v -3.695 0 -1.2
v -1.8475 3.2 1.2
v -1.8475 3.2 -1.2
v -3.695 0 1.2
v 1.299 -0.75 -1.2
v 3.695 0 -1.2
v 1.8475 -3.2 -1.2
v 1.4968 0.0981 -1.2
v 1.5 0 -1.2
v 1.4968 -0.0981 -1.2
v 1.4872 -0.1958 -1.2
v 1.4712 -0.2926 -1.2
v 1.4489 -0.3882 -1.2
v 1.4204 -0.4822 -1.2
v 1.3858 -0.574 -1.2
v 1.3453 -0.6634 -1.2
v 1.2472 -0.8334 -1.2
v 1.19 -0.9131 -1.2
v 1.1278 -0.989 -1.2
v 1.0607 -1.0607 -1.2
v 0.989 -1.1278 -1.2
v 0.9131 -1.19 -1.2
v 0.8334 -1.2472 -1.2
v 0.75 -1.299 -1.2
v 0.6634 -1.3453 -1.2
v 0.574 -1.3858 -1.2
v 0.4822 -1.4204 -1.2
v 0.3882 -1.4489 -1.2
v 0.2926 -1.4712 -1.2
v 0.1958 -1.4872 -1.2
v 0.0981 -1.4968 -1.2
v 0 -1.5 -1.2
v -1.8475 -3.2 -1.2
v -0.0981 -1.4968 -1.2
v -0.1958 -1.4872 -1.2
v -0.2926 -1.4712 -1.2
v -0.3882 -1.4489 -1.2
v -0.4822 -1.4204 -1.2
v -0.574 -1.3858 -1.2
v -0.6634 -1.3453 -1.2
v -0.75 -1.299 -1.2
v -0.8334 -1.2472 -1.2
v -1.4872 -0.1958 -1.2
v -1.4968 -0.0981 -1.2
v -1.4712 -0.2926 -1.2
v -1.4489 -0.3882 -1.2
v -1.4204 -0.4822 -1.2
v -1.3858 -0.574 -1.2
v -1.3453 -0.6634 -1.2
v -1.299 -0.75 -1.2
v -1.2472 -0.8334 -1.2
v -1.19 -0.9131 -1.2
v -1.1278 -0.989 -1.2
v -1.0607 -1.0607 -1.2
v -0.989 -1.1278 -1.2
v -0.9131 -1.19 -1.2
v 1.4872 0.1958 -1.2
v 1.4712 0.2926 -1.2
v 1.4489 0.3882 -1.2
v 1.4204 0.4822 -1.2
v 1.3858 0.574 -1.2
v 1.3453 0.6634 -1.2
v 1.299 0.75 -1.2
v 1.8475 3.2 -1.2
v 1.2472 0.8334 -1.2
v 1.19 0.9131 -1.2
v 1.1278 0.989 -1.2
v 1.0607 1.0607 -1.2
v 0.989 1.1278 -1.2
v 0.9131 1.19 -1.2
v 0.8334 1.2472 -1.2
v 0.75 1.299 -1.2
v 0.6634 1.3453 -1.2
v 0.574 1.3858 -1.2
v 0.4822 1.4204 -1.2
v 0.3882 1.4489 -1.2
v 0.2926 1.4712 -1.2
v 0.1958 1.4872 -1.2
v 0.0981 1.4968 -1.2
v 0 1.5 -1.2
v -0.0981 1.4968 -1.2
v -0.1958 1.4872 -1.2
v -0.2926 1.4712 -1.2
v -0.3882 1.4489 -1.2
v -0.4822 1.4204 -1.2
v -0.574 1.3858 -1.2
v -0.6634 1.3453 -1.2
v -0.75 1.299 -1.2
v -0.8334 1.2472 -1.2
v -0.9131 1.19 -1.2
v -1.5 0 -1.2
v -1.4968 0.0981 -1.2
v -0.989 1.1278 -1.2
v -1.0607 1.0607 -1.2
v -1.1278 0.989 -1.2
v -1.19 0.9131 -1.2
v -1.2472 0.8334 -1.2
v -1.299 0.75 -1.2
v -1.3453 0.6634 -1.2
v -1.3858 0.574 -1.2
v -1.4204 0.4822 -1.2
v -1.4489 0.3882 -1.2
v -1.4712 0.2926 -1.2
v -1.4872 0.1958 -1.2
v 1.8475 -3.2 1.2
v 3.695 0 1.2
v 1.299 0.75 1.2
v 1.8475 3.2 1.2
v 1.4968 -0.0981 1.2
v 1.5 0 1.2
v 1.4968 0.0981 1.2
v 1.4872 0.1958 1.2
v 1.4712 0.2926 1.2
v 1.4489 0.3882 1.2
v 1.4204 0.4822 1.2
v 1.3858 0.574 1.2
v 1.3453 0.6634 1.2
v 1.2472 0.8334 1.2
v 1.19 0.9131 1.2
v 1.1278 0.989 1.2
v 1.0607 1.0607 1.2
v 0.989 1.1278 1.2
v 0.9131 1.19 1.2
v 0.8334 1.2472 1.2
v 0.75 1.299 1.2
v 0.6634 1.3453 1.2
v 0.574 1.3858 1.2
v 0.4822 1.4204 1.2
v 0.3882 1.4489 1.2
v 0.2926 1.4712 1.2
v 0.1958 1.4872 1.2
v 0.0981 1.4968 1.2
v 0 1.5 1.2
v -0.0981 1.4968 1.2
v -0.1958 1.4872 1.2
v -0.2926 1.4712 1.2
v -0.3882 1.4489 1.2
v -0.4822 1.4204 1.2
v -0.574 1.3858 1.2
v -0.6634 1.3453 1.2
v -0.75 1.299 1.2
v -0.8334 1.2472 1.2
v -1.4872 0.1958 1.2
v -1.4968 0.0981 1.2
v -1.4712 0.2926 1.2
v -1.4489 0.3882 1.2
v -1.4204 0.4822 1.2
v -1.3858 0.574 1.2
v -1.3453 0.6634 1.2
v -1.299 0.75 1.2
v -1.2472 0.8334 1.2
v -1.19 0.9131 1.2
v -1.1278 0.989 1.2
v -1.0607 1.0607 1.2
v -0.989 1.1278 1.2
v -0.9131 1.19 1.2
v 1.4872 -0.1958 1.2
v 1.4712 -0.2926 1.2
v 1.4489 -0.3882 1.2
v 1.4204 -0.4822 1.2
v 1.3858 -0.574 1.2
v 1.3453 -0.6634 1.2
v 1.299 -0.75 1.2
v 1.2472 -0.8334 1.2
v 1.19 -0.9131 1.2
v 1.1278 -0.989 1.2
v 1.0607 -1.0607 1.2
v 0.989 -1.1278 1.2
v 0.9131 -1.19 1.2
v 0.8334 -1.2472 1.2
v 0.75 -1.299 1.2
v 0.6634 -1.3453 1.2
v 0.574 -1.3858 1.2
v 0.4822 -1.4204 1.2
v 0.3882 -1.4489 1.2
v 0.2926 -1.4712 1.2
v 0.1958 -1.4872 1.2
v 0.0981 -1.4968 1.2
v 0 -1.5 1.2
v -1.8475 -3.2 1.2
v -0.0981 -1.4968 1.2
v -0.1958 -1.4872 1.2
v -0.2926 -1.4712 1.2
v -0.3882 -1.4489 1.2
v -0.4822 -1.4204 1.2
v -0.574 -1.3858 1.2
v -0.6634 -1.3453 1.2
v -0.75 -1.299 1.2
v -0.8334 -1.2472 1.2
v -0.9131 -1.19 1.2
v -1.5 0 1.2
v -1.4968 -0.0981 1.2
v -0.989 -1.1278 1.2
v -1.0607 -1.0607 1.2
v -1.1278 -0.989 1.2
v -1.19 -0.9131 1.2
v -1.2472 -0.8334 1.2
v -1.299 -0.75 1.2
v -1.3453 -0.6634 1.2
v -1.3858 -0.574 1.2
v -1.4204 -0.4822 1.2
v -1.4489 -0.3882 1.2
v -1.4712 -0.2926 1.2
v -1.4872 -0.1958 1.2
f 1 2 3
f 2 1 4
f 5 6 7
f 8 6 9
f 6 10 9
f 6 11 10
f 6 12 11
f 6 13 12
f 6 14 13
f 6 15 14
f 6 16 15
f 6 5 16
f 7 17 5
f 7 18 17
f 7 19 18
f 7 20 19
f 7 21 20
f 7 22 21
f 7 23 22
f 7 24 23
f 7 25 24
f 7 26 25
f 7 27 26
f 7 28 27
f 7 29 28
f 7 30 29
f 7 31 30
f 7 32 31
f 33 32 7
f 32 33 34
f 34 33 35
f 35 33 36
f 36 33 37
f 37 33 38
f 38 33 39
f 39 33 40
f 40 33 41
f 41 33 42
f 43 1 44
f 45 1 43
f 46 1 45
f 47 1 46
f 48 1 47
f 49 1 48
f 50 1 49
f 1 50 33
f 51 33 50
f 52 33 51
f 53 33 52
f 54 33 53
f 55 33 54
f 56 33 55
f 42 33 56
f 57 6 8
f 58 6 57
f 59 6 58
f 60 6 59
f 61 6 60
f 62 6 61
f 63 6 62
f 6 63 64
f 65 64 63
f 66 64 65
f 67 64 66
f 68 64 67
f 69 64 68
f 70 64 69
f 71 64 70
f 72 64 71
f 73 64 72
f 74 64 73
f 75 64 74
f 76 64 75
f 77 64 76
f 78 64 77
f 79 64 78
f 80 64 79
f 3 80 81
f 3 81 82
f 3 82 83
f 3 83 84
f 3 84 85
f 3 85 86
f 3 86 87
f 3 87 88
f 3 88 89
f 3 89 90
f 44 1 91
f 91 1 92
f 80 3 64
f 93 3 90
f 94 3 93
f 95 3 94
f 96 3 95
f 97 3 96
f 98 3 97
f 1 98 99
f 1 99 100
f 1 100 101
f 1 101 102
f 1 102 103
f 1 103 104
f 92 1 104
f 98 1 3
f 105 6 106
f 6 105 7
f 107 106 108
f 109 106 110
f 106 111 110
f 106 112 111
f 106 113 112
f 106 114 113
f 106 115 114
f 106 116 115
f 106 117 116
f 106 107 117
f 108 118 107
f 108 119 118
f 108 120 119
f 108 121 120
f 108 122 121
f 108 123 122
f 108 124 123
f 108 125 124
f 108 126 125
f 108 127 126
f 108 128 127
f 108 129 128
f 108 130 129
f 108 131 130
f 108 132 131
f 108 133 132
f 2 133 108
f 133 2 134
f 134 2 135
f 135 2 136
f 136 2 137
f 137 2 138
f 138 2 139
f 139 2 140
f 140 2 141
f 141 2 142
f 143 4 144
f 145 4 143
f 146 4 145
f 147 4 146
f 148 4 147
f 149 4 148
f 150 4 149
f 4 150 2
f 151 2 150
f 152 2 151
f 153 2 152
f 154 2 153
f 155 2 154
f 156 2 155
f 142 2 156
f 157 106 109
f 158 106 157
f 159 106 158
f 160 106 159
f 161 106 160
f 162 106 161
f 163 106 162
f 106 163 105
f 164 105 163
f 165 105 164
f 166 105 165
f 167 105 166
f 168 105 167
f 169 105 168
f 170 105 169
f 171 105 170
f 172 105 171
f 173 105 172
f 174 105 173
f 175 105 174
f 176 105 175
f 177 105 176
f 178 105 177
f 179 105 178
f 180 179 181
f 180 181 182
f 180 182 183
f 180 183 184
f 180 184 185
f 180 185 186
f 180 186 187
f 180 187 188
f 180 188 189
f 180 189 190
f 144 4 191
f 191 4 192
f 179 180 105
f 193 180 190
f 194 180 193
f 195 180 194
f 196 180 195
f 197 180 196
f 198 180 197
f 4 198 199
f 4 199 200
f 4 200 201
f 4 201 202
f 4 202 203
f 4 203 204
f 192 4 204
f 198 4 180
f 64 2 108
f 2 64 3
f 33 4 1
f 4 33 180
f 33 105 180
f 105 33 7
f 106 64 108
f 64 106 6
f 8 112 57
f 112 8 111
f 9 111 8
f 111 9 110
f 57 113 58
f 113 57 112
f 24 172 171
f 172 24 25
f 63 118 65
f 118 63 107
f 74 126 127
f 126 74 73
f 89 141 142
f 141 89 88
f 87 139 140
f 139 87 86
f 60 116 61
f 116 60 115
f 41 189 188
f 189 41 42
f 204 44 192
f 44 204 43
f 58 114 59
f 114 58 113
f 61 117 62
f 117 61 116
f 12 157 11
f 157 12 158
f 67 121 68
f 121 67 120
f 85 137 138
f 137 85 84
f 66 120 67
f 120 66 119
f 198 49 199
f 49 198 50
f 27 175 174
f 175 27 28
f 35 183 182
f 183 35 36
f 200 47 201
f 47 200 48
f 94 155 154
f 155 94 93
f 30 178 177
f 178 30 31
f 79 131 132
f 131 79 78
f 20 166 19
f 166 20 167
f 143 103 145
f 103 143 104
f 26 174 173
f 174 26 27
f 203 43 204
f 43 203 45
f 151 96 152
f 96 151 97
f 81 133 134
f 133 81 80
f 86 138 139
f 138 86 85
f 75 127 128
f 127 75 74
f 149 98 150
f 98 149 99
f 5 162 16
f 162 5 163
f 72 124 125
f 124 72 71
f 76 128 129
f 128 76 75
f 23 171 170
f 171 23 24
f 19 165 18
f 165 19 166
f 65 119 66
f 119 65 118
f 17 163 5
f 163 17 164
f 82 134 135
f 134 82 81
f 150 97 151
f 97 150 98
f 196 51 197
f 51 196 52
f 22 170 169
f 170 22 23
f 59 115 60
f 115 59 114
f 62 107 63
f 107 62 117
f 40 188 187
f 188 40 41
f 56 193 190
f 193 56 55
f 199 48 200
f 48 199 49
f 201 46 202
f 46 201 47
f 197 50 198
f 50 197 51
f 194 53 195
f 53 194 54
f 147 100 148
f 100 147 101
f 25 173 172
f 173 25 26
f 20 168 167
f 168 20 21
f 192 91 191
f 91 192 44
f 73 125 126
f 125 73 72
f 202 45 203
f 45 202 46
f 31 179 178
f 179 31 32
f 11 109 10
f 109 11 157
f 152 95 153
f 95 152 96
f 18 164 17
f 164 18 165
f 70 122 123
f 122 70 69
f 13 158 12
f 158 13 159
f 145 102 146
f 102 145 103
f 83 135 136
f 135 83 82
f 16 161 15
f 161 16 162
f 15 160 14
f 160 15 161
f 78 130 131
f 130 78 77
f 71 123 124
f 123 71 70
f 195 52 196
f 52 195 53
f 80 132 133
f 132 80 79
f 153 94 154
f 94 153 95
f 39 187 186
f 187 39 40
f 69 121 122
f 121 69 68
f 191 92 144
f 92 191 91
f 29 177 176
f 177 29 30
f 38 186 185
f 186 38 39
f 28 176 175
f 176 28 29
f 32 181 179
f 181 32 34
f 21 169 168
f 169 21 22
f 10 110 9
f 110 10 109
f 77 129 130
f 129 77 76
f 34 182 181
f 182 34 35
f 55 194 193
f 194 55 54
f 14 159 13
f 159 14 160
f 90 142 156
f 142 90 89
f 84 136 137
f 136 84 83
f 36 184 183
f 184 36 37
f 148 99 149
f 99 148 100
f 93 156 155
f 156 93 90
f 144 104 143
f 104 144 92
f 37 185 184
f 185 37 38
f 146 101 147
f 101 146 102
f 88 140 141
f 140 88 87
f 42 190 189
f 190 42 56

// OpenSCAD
$fn = 96;

// Target dimensions
across_flats = 6.4;   // mm
thickness    = 2.4;   // mm
hole_d       = 3.0;   // mm (clearance/through hole)

// Derived
R = across_flats / sqrt(3);  // circumradius for a hex with given across-flats
eps = 0.02;

module hex_prism(af, h) {
    linear_extrude(height=h, center=true)
        circle(r=af/sqrt(3), $fn=6);
}

module nut() {
    difference() {
        // One connected solid: simple hex prism at exact size
        hex_prism(across_flats, thickness);

        // Through hole (extend beyond thickness to guarantee cut)
        cylinder(h=thickness + 2*eps, d=hole_d, center=true);
    }
}

nut();
